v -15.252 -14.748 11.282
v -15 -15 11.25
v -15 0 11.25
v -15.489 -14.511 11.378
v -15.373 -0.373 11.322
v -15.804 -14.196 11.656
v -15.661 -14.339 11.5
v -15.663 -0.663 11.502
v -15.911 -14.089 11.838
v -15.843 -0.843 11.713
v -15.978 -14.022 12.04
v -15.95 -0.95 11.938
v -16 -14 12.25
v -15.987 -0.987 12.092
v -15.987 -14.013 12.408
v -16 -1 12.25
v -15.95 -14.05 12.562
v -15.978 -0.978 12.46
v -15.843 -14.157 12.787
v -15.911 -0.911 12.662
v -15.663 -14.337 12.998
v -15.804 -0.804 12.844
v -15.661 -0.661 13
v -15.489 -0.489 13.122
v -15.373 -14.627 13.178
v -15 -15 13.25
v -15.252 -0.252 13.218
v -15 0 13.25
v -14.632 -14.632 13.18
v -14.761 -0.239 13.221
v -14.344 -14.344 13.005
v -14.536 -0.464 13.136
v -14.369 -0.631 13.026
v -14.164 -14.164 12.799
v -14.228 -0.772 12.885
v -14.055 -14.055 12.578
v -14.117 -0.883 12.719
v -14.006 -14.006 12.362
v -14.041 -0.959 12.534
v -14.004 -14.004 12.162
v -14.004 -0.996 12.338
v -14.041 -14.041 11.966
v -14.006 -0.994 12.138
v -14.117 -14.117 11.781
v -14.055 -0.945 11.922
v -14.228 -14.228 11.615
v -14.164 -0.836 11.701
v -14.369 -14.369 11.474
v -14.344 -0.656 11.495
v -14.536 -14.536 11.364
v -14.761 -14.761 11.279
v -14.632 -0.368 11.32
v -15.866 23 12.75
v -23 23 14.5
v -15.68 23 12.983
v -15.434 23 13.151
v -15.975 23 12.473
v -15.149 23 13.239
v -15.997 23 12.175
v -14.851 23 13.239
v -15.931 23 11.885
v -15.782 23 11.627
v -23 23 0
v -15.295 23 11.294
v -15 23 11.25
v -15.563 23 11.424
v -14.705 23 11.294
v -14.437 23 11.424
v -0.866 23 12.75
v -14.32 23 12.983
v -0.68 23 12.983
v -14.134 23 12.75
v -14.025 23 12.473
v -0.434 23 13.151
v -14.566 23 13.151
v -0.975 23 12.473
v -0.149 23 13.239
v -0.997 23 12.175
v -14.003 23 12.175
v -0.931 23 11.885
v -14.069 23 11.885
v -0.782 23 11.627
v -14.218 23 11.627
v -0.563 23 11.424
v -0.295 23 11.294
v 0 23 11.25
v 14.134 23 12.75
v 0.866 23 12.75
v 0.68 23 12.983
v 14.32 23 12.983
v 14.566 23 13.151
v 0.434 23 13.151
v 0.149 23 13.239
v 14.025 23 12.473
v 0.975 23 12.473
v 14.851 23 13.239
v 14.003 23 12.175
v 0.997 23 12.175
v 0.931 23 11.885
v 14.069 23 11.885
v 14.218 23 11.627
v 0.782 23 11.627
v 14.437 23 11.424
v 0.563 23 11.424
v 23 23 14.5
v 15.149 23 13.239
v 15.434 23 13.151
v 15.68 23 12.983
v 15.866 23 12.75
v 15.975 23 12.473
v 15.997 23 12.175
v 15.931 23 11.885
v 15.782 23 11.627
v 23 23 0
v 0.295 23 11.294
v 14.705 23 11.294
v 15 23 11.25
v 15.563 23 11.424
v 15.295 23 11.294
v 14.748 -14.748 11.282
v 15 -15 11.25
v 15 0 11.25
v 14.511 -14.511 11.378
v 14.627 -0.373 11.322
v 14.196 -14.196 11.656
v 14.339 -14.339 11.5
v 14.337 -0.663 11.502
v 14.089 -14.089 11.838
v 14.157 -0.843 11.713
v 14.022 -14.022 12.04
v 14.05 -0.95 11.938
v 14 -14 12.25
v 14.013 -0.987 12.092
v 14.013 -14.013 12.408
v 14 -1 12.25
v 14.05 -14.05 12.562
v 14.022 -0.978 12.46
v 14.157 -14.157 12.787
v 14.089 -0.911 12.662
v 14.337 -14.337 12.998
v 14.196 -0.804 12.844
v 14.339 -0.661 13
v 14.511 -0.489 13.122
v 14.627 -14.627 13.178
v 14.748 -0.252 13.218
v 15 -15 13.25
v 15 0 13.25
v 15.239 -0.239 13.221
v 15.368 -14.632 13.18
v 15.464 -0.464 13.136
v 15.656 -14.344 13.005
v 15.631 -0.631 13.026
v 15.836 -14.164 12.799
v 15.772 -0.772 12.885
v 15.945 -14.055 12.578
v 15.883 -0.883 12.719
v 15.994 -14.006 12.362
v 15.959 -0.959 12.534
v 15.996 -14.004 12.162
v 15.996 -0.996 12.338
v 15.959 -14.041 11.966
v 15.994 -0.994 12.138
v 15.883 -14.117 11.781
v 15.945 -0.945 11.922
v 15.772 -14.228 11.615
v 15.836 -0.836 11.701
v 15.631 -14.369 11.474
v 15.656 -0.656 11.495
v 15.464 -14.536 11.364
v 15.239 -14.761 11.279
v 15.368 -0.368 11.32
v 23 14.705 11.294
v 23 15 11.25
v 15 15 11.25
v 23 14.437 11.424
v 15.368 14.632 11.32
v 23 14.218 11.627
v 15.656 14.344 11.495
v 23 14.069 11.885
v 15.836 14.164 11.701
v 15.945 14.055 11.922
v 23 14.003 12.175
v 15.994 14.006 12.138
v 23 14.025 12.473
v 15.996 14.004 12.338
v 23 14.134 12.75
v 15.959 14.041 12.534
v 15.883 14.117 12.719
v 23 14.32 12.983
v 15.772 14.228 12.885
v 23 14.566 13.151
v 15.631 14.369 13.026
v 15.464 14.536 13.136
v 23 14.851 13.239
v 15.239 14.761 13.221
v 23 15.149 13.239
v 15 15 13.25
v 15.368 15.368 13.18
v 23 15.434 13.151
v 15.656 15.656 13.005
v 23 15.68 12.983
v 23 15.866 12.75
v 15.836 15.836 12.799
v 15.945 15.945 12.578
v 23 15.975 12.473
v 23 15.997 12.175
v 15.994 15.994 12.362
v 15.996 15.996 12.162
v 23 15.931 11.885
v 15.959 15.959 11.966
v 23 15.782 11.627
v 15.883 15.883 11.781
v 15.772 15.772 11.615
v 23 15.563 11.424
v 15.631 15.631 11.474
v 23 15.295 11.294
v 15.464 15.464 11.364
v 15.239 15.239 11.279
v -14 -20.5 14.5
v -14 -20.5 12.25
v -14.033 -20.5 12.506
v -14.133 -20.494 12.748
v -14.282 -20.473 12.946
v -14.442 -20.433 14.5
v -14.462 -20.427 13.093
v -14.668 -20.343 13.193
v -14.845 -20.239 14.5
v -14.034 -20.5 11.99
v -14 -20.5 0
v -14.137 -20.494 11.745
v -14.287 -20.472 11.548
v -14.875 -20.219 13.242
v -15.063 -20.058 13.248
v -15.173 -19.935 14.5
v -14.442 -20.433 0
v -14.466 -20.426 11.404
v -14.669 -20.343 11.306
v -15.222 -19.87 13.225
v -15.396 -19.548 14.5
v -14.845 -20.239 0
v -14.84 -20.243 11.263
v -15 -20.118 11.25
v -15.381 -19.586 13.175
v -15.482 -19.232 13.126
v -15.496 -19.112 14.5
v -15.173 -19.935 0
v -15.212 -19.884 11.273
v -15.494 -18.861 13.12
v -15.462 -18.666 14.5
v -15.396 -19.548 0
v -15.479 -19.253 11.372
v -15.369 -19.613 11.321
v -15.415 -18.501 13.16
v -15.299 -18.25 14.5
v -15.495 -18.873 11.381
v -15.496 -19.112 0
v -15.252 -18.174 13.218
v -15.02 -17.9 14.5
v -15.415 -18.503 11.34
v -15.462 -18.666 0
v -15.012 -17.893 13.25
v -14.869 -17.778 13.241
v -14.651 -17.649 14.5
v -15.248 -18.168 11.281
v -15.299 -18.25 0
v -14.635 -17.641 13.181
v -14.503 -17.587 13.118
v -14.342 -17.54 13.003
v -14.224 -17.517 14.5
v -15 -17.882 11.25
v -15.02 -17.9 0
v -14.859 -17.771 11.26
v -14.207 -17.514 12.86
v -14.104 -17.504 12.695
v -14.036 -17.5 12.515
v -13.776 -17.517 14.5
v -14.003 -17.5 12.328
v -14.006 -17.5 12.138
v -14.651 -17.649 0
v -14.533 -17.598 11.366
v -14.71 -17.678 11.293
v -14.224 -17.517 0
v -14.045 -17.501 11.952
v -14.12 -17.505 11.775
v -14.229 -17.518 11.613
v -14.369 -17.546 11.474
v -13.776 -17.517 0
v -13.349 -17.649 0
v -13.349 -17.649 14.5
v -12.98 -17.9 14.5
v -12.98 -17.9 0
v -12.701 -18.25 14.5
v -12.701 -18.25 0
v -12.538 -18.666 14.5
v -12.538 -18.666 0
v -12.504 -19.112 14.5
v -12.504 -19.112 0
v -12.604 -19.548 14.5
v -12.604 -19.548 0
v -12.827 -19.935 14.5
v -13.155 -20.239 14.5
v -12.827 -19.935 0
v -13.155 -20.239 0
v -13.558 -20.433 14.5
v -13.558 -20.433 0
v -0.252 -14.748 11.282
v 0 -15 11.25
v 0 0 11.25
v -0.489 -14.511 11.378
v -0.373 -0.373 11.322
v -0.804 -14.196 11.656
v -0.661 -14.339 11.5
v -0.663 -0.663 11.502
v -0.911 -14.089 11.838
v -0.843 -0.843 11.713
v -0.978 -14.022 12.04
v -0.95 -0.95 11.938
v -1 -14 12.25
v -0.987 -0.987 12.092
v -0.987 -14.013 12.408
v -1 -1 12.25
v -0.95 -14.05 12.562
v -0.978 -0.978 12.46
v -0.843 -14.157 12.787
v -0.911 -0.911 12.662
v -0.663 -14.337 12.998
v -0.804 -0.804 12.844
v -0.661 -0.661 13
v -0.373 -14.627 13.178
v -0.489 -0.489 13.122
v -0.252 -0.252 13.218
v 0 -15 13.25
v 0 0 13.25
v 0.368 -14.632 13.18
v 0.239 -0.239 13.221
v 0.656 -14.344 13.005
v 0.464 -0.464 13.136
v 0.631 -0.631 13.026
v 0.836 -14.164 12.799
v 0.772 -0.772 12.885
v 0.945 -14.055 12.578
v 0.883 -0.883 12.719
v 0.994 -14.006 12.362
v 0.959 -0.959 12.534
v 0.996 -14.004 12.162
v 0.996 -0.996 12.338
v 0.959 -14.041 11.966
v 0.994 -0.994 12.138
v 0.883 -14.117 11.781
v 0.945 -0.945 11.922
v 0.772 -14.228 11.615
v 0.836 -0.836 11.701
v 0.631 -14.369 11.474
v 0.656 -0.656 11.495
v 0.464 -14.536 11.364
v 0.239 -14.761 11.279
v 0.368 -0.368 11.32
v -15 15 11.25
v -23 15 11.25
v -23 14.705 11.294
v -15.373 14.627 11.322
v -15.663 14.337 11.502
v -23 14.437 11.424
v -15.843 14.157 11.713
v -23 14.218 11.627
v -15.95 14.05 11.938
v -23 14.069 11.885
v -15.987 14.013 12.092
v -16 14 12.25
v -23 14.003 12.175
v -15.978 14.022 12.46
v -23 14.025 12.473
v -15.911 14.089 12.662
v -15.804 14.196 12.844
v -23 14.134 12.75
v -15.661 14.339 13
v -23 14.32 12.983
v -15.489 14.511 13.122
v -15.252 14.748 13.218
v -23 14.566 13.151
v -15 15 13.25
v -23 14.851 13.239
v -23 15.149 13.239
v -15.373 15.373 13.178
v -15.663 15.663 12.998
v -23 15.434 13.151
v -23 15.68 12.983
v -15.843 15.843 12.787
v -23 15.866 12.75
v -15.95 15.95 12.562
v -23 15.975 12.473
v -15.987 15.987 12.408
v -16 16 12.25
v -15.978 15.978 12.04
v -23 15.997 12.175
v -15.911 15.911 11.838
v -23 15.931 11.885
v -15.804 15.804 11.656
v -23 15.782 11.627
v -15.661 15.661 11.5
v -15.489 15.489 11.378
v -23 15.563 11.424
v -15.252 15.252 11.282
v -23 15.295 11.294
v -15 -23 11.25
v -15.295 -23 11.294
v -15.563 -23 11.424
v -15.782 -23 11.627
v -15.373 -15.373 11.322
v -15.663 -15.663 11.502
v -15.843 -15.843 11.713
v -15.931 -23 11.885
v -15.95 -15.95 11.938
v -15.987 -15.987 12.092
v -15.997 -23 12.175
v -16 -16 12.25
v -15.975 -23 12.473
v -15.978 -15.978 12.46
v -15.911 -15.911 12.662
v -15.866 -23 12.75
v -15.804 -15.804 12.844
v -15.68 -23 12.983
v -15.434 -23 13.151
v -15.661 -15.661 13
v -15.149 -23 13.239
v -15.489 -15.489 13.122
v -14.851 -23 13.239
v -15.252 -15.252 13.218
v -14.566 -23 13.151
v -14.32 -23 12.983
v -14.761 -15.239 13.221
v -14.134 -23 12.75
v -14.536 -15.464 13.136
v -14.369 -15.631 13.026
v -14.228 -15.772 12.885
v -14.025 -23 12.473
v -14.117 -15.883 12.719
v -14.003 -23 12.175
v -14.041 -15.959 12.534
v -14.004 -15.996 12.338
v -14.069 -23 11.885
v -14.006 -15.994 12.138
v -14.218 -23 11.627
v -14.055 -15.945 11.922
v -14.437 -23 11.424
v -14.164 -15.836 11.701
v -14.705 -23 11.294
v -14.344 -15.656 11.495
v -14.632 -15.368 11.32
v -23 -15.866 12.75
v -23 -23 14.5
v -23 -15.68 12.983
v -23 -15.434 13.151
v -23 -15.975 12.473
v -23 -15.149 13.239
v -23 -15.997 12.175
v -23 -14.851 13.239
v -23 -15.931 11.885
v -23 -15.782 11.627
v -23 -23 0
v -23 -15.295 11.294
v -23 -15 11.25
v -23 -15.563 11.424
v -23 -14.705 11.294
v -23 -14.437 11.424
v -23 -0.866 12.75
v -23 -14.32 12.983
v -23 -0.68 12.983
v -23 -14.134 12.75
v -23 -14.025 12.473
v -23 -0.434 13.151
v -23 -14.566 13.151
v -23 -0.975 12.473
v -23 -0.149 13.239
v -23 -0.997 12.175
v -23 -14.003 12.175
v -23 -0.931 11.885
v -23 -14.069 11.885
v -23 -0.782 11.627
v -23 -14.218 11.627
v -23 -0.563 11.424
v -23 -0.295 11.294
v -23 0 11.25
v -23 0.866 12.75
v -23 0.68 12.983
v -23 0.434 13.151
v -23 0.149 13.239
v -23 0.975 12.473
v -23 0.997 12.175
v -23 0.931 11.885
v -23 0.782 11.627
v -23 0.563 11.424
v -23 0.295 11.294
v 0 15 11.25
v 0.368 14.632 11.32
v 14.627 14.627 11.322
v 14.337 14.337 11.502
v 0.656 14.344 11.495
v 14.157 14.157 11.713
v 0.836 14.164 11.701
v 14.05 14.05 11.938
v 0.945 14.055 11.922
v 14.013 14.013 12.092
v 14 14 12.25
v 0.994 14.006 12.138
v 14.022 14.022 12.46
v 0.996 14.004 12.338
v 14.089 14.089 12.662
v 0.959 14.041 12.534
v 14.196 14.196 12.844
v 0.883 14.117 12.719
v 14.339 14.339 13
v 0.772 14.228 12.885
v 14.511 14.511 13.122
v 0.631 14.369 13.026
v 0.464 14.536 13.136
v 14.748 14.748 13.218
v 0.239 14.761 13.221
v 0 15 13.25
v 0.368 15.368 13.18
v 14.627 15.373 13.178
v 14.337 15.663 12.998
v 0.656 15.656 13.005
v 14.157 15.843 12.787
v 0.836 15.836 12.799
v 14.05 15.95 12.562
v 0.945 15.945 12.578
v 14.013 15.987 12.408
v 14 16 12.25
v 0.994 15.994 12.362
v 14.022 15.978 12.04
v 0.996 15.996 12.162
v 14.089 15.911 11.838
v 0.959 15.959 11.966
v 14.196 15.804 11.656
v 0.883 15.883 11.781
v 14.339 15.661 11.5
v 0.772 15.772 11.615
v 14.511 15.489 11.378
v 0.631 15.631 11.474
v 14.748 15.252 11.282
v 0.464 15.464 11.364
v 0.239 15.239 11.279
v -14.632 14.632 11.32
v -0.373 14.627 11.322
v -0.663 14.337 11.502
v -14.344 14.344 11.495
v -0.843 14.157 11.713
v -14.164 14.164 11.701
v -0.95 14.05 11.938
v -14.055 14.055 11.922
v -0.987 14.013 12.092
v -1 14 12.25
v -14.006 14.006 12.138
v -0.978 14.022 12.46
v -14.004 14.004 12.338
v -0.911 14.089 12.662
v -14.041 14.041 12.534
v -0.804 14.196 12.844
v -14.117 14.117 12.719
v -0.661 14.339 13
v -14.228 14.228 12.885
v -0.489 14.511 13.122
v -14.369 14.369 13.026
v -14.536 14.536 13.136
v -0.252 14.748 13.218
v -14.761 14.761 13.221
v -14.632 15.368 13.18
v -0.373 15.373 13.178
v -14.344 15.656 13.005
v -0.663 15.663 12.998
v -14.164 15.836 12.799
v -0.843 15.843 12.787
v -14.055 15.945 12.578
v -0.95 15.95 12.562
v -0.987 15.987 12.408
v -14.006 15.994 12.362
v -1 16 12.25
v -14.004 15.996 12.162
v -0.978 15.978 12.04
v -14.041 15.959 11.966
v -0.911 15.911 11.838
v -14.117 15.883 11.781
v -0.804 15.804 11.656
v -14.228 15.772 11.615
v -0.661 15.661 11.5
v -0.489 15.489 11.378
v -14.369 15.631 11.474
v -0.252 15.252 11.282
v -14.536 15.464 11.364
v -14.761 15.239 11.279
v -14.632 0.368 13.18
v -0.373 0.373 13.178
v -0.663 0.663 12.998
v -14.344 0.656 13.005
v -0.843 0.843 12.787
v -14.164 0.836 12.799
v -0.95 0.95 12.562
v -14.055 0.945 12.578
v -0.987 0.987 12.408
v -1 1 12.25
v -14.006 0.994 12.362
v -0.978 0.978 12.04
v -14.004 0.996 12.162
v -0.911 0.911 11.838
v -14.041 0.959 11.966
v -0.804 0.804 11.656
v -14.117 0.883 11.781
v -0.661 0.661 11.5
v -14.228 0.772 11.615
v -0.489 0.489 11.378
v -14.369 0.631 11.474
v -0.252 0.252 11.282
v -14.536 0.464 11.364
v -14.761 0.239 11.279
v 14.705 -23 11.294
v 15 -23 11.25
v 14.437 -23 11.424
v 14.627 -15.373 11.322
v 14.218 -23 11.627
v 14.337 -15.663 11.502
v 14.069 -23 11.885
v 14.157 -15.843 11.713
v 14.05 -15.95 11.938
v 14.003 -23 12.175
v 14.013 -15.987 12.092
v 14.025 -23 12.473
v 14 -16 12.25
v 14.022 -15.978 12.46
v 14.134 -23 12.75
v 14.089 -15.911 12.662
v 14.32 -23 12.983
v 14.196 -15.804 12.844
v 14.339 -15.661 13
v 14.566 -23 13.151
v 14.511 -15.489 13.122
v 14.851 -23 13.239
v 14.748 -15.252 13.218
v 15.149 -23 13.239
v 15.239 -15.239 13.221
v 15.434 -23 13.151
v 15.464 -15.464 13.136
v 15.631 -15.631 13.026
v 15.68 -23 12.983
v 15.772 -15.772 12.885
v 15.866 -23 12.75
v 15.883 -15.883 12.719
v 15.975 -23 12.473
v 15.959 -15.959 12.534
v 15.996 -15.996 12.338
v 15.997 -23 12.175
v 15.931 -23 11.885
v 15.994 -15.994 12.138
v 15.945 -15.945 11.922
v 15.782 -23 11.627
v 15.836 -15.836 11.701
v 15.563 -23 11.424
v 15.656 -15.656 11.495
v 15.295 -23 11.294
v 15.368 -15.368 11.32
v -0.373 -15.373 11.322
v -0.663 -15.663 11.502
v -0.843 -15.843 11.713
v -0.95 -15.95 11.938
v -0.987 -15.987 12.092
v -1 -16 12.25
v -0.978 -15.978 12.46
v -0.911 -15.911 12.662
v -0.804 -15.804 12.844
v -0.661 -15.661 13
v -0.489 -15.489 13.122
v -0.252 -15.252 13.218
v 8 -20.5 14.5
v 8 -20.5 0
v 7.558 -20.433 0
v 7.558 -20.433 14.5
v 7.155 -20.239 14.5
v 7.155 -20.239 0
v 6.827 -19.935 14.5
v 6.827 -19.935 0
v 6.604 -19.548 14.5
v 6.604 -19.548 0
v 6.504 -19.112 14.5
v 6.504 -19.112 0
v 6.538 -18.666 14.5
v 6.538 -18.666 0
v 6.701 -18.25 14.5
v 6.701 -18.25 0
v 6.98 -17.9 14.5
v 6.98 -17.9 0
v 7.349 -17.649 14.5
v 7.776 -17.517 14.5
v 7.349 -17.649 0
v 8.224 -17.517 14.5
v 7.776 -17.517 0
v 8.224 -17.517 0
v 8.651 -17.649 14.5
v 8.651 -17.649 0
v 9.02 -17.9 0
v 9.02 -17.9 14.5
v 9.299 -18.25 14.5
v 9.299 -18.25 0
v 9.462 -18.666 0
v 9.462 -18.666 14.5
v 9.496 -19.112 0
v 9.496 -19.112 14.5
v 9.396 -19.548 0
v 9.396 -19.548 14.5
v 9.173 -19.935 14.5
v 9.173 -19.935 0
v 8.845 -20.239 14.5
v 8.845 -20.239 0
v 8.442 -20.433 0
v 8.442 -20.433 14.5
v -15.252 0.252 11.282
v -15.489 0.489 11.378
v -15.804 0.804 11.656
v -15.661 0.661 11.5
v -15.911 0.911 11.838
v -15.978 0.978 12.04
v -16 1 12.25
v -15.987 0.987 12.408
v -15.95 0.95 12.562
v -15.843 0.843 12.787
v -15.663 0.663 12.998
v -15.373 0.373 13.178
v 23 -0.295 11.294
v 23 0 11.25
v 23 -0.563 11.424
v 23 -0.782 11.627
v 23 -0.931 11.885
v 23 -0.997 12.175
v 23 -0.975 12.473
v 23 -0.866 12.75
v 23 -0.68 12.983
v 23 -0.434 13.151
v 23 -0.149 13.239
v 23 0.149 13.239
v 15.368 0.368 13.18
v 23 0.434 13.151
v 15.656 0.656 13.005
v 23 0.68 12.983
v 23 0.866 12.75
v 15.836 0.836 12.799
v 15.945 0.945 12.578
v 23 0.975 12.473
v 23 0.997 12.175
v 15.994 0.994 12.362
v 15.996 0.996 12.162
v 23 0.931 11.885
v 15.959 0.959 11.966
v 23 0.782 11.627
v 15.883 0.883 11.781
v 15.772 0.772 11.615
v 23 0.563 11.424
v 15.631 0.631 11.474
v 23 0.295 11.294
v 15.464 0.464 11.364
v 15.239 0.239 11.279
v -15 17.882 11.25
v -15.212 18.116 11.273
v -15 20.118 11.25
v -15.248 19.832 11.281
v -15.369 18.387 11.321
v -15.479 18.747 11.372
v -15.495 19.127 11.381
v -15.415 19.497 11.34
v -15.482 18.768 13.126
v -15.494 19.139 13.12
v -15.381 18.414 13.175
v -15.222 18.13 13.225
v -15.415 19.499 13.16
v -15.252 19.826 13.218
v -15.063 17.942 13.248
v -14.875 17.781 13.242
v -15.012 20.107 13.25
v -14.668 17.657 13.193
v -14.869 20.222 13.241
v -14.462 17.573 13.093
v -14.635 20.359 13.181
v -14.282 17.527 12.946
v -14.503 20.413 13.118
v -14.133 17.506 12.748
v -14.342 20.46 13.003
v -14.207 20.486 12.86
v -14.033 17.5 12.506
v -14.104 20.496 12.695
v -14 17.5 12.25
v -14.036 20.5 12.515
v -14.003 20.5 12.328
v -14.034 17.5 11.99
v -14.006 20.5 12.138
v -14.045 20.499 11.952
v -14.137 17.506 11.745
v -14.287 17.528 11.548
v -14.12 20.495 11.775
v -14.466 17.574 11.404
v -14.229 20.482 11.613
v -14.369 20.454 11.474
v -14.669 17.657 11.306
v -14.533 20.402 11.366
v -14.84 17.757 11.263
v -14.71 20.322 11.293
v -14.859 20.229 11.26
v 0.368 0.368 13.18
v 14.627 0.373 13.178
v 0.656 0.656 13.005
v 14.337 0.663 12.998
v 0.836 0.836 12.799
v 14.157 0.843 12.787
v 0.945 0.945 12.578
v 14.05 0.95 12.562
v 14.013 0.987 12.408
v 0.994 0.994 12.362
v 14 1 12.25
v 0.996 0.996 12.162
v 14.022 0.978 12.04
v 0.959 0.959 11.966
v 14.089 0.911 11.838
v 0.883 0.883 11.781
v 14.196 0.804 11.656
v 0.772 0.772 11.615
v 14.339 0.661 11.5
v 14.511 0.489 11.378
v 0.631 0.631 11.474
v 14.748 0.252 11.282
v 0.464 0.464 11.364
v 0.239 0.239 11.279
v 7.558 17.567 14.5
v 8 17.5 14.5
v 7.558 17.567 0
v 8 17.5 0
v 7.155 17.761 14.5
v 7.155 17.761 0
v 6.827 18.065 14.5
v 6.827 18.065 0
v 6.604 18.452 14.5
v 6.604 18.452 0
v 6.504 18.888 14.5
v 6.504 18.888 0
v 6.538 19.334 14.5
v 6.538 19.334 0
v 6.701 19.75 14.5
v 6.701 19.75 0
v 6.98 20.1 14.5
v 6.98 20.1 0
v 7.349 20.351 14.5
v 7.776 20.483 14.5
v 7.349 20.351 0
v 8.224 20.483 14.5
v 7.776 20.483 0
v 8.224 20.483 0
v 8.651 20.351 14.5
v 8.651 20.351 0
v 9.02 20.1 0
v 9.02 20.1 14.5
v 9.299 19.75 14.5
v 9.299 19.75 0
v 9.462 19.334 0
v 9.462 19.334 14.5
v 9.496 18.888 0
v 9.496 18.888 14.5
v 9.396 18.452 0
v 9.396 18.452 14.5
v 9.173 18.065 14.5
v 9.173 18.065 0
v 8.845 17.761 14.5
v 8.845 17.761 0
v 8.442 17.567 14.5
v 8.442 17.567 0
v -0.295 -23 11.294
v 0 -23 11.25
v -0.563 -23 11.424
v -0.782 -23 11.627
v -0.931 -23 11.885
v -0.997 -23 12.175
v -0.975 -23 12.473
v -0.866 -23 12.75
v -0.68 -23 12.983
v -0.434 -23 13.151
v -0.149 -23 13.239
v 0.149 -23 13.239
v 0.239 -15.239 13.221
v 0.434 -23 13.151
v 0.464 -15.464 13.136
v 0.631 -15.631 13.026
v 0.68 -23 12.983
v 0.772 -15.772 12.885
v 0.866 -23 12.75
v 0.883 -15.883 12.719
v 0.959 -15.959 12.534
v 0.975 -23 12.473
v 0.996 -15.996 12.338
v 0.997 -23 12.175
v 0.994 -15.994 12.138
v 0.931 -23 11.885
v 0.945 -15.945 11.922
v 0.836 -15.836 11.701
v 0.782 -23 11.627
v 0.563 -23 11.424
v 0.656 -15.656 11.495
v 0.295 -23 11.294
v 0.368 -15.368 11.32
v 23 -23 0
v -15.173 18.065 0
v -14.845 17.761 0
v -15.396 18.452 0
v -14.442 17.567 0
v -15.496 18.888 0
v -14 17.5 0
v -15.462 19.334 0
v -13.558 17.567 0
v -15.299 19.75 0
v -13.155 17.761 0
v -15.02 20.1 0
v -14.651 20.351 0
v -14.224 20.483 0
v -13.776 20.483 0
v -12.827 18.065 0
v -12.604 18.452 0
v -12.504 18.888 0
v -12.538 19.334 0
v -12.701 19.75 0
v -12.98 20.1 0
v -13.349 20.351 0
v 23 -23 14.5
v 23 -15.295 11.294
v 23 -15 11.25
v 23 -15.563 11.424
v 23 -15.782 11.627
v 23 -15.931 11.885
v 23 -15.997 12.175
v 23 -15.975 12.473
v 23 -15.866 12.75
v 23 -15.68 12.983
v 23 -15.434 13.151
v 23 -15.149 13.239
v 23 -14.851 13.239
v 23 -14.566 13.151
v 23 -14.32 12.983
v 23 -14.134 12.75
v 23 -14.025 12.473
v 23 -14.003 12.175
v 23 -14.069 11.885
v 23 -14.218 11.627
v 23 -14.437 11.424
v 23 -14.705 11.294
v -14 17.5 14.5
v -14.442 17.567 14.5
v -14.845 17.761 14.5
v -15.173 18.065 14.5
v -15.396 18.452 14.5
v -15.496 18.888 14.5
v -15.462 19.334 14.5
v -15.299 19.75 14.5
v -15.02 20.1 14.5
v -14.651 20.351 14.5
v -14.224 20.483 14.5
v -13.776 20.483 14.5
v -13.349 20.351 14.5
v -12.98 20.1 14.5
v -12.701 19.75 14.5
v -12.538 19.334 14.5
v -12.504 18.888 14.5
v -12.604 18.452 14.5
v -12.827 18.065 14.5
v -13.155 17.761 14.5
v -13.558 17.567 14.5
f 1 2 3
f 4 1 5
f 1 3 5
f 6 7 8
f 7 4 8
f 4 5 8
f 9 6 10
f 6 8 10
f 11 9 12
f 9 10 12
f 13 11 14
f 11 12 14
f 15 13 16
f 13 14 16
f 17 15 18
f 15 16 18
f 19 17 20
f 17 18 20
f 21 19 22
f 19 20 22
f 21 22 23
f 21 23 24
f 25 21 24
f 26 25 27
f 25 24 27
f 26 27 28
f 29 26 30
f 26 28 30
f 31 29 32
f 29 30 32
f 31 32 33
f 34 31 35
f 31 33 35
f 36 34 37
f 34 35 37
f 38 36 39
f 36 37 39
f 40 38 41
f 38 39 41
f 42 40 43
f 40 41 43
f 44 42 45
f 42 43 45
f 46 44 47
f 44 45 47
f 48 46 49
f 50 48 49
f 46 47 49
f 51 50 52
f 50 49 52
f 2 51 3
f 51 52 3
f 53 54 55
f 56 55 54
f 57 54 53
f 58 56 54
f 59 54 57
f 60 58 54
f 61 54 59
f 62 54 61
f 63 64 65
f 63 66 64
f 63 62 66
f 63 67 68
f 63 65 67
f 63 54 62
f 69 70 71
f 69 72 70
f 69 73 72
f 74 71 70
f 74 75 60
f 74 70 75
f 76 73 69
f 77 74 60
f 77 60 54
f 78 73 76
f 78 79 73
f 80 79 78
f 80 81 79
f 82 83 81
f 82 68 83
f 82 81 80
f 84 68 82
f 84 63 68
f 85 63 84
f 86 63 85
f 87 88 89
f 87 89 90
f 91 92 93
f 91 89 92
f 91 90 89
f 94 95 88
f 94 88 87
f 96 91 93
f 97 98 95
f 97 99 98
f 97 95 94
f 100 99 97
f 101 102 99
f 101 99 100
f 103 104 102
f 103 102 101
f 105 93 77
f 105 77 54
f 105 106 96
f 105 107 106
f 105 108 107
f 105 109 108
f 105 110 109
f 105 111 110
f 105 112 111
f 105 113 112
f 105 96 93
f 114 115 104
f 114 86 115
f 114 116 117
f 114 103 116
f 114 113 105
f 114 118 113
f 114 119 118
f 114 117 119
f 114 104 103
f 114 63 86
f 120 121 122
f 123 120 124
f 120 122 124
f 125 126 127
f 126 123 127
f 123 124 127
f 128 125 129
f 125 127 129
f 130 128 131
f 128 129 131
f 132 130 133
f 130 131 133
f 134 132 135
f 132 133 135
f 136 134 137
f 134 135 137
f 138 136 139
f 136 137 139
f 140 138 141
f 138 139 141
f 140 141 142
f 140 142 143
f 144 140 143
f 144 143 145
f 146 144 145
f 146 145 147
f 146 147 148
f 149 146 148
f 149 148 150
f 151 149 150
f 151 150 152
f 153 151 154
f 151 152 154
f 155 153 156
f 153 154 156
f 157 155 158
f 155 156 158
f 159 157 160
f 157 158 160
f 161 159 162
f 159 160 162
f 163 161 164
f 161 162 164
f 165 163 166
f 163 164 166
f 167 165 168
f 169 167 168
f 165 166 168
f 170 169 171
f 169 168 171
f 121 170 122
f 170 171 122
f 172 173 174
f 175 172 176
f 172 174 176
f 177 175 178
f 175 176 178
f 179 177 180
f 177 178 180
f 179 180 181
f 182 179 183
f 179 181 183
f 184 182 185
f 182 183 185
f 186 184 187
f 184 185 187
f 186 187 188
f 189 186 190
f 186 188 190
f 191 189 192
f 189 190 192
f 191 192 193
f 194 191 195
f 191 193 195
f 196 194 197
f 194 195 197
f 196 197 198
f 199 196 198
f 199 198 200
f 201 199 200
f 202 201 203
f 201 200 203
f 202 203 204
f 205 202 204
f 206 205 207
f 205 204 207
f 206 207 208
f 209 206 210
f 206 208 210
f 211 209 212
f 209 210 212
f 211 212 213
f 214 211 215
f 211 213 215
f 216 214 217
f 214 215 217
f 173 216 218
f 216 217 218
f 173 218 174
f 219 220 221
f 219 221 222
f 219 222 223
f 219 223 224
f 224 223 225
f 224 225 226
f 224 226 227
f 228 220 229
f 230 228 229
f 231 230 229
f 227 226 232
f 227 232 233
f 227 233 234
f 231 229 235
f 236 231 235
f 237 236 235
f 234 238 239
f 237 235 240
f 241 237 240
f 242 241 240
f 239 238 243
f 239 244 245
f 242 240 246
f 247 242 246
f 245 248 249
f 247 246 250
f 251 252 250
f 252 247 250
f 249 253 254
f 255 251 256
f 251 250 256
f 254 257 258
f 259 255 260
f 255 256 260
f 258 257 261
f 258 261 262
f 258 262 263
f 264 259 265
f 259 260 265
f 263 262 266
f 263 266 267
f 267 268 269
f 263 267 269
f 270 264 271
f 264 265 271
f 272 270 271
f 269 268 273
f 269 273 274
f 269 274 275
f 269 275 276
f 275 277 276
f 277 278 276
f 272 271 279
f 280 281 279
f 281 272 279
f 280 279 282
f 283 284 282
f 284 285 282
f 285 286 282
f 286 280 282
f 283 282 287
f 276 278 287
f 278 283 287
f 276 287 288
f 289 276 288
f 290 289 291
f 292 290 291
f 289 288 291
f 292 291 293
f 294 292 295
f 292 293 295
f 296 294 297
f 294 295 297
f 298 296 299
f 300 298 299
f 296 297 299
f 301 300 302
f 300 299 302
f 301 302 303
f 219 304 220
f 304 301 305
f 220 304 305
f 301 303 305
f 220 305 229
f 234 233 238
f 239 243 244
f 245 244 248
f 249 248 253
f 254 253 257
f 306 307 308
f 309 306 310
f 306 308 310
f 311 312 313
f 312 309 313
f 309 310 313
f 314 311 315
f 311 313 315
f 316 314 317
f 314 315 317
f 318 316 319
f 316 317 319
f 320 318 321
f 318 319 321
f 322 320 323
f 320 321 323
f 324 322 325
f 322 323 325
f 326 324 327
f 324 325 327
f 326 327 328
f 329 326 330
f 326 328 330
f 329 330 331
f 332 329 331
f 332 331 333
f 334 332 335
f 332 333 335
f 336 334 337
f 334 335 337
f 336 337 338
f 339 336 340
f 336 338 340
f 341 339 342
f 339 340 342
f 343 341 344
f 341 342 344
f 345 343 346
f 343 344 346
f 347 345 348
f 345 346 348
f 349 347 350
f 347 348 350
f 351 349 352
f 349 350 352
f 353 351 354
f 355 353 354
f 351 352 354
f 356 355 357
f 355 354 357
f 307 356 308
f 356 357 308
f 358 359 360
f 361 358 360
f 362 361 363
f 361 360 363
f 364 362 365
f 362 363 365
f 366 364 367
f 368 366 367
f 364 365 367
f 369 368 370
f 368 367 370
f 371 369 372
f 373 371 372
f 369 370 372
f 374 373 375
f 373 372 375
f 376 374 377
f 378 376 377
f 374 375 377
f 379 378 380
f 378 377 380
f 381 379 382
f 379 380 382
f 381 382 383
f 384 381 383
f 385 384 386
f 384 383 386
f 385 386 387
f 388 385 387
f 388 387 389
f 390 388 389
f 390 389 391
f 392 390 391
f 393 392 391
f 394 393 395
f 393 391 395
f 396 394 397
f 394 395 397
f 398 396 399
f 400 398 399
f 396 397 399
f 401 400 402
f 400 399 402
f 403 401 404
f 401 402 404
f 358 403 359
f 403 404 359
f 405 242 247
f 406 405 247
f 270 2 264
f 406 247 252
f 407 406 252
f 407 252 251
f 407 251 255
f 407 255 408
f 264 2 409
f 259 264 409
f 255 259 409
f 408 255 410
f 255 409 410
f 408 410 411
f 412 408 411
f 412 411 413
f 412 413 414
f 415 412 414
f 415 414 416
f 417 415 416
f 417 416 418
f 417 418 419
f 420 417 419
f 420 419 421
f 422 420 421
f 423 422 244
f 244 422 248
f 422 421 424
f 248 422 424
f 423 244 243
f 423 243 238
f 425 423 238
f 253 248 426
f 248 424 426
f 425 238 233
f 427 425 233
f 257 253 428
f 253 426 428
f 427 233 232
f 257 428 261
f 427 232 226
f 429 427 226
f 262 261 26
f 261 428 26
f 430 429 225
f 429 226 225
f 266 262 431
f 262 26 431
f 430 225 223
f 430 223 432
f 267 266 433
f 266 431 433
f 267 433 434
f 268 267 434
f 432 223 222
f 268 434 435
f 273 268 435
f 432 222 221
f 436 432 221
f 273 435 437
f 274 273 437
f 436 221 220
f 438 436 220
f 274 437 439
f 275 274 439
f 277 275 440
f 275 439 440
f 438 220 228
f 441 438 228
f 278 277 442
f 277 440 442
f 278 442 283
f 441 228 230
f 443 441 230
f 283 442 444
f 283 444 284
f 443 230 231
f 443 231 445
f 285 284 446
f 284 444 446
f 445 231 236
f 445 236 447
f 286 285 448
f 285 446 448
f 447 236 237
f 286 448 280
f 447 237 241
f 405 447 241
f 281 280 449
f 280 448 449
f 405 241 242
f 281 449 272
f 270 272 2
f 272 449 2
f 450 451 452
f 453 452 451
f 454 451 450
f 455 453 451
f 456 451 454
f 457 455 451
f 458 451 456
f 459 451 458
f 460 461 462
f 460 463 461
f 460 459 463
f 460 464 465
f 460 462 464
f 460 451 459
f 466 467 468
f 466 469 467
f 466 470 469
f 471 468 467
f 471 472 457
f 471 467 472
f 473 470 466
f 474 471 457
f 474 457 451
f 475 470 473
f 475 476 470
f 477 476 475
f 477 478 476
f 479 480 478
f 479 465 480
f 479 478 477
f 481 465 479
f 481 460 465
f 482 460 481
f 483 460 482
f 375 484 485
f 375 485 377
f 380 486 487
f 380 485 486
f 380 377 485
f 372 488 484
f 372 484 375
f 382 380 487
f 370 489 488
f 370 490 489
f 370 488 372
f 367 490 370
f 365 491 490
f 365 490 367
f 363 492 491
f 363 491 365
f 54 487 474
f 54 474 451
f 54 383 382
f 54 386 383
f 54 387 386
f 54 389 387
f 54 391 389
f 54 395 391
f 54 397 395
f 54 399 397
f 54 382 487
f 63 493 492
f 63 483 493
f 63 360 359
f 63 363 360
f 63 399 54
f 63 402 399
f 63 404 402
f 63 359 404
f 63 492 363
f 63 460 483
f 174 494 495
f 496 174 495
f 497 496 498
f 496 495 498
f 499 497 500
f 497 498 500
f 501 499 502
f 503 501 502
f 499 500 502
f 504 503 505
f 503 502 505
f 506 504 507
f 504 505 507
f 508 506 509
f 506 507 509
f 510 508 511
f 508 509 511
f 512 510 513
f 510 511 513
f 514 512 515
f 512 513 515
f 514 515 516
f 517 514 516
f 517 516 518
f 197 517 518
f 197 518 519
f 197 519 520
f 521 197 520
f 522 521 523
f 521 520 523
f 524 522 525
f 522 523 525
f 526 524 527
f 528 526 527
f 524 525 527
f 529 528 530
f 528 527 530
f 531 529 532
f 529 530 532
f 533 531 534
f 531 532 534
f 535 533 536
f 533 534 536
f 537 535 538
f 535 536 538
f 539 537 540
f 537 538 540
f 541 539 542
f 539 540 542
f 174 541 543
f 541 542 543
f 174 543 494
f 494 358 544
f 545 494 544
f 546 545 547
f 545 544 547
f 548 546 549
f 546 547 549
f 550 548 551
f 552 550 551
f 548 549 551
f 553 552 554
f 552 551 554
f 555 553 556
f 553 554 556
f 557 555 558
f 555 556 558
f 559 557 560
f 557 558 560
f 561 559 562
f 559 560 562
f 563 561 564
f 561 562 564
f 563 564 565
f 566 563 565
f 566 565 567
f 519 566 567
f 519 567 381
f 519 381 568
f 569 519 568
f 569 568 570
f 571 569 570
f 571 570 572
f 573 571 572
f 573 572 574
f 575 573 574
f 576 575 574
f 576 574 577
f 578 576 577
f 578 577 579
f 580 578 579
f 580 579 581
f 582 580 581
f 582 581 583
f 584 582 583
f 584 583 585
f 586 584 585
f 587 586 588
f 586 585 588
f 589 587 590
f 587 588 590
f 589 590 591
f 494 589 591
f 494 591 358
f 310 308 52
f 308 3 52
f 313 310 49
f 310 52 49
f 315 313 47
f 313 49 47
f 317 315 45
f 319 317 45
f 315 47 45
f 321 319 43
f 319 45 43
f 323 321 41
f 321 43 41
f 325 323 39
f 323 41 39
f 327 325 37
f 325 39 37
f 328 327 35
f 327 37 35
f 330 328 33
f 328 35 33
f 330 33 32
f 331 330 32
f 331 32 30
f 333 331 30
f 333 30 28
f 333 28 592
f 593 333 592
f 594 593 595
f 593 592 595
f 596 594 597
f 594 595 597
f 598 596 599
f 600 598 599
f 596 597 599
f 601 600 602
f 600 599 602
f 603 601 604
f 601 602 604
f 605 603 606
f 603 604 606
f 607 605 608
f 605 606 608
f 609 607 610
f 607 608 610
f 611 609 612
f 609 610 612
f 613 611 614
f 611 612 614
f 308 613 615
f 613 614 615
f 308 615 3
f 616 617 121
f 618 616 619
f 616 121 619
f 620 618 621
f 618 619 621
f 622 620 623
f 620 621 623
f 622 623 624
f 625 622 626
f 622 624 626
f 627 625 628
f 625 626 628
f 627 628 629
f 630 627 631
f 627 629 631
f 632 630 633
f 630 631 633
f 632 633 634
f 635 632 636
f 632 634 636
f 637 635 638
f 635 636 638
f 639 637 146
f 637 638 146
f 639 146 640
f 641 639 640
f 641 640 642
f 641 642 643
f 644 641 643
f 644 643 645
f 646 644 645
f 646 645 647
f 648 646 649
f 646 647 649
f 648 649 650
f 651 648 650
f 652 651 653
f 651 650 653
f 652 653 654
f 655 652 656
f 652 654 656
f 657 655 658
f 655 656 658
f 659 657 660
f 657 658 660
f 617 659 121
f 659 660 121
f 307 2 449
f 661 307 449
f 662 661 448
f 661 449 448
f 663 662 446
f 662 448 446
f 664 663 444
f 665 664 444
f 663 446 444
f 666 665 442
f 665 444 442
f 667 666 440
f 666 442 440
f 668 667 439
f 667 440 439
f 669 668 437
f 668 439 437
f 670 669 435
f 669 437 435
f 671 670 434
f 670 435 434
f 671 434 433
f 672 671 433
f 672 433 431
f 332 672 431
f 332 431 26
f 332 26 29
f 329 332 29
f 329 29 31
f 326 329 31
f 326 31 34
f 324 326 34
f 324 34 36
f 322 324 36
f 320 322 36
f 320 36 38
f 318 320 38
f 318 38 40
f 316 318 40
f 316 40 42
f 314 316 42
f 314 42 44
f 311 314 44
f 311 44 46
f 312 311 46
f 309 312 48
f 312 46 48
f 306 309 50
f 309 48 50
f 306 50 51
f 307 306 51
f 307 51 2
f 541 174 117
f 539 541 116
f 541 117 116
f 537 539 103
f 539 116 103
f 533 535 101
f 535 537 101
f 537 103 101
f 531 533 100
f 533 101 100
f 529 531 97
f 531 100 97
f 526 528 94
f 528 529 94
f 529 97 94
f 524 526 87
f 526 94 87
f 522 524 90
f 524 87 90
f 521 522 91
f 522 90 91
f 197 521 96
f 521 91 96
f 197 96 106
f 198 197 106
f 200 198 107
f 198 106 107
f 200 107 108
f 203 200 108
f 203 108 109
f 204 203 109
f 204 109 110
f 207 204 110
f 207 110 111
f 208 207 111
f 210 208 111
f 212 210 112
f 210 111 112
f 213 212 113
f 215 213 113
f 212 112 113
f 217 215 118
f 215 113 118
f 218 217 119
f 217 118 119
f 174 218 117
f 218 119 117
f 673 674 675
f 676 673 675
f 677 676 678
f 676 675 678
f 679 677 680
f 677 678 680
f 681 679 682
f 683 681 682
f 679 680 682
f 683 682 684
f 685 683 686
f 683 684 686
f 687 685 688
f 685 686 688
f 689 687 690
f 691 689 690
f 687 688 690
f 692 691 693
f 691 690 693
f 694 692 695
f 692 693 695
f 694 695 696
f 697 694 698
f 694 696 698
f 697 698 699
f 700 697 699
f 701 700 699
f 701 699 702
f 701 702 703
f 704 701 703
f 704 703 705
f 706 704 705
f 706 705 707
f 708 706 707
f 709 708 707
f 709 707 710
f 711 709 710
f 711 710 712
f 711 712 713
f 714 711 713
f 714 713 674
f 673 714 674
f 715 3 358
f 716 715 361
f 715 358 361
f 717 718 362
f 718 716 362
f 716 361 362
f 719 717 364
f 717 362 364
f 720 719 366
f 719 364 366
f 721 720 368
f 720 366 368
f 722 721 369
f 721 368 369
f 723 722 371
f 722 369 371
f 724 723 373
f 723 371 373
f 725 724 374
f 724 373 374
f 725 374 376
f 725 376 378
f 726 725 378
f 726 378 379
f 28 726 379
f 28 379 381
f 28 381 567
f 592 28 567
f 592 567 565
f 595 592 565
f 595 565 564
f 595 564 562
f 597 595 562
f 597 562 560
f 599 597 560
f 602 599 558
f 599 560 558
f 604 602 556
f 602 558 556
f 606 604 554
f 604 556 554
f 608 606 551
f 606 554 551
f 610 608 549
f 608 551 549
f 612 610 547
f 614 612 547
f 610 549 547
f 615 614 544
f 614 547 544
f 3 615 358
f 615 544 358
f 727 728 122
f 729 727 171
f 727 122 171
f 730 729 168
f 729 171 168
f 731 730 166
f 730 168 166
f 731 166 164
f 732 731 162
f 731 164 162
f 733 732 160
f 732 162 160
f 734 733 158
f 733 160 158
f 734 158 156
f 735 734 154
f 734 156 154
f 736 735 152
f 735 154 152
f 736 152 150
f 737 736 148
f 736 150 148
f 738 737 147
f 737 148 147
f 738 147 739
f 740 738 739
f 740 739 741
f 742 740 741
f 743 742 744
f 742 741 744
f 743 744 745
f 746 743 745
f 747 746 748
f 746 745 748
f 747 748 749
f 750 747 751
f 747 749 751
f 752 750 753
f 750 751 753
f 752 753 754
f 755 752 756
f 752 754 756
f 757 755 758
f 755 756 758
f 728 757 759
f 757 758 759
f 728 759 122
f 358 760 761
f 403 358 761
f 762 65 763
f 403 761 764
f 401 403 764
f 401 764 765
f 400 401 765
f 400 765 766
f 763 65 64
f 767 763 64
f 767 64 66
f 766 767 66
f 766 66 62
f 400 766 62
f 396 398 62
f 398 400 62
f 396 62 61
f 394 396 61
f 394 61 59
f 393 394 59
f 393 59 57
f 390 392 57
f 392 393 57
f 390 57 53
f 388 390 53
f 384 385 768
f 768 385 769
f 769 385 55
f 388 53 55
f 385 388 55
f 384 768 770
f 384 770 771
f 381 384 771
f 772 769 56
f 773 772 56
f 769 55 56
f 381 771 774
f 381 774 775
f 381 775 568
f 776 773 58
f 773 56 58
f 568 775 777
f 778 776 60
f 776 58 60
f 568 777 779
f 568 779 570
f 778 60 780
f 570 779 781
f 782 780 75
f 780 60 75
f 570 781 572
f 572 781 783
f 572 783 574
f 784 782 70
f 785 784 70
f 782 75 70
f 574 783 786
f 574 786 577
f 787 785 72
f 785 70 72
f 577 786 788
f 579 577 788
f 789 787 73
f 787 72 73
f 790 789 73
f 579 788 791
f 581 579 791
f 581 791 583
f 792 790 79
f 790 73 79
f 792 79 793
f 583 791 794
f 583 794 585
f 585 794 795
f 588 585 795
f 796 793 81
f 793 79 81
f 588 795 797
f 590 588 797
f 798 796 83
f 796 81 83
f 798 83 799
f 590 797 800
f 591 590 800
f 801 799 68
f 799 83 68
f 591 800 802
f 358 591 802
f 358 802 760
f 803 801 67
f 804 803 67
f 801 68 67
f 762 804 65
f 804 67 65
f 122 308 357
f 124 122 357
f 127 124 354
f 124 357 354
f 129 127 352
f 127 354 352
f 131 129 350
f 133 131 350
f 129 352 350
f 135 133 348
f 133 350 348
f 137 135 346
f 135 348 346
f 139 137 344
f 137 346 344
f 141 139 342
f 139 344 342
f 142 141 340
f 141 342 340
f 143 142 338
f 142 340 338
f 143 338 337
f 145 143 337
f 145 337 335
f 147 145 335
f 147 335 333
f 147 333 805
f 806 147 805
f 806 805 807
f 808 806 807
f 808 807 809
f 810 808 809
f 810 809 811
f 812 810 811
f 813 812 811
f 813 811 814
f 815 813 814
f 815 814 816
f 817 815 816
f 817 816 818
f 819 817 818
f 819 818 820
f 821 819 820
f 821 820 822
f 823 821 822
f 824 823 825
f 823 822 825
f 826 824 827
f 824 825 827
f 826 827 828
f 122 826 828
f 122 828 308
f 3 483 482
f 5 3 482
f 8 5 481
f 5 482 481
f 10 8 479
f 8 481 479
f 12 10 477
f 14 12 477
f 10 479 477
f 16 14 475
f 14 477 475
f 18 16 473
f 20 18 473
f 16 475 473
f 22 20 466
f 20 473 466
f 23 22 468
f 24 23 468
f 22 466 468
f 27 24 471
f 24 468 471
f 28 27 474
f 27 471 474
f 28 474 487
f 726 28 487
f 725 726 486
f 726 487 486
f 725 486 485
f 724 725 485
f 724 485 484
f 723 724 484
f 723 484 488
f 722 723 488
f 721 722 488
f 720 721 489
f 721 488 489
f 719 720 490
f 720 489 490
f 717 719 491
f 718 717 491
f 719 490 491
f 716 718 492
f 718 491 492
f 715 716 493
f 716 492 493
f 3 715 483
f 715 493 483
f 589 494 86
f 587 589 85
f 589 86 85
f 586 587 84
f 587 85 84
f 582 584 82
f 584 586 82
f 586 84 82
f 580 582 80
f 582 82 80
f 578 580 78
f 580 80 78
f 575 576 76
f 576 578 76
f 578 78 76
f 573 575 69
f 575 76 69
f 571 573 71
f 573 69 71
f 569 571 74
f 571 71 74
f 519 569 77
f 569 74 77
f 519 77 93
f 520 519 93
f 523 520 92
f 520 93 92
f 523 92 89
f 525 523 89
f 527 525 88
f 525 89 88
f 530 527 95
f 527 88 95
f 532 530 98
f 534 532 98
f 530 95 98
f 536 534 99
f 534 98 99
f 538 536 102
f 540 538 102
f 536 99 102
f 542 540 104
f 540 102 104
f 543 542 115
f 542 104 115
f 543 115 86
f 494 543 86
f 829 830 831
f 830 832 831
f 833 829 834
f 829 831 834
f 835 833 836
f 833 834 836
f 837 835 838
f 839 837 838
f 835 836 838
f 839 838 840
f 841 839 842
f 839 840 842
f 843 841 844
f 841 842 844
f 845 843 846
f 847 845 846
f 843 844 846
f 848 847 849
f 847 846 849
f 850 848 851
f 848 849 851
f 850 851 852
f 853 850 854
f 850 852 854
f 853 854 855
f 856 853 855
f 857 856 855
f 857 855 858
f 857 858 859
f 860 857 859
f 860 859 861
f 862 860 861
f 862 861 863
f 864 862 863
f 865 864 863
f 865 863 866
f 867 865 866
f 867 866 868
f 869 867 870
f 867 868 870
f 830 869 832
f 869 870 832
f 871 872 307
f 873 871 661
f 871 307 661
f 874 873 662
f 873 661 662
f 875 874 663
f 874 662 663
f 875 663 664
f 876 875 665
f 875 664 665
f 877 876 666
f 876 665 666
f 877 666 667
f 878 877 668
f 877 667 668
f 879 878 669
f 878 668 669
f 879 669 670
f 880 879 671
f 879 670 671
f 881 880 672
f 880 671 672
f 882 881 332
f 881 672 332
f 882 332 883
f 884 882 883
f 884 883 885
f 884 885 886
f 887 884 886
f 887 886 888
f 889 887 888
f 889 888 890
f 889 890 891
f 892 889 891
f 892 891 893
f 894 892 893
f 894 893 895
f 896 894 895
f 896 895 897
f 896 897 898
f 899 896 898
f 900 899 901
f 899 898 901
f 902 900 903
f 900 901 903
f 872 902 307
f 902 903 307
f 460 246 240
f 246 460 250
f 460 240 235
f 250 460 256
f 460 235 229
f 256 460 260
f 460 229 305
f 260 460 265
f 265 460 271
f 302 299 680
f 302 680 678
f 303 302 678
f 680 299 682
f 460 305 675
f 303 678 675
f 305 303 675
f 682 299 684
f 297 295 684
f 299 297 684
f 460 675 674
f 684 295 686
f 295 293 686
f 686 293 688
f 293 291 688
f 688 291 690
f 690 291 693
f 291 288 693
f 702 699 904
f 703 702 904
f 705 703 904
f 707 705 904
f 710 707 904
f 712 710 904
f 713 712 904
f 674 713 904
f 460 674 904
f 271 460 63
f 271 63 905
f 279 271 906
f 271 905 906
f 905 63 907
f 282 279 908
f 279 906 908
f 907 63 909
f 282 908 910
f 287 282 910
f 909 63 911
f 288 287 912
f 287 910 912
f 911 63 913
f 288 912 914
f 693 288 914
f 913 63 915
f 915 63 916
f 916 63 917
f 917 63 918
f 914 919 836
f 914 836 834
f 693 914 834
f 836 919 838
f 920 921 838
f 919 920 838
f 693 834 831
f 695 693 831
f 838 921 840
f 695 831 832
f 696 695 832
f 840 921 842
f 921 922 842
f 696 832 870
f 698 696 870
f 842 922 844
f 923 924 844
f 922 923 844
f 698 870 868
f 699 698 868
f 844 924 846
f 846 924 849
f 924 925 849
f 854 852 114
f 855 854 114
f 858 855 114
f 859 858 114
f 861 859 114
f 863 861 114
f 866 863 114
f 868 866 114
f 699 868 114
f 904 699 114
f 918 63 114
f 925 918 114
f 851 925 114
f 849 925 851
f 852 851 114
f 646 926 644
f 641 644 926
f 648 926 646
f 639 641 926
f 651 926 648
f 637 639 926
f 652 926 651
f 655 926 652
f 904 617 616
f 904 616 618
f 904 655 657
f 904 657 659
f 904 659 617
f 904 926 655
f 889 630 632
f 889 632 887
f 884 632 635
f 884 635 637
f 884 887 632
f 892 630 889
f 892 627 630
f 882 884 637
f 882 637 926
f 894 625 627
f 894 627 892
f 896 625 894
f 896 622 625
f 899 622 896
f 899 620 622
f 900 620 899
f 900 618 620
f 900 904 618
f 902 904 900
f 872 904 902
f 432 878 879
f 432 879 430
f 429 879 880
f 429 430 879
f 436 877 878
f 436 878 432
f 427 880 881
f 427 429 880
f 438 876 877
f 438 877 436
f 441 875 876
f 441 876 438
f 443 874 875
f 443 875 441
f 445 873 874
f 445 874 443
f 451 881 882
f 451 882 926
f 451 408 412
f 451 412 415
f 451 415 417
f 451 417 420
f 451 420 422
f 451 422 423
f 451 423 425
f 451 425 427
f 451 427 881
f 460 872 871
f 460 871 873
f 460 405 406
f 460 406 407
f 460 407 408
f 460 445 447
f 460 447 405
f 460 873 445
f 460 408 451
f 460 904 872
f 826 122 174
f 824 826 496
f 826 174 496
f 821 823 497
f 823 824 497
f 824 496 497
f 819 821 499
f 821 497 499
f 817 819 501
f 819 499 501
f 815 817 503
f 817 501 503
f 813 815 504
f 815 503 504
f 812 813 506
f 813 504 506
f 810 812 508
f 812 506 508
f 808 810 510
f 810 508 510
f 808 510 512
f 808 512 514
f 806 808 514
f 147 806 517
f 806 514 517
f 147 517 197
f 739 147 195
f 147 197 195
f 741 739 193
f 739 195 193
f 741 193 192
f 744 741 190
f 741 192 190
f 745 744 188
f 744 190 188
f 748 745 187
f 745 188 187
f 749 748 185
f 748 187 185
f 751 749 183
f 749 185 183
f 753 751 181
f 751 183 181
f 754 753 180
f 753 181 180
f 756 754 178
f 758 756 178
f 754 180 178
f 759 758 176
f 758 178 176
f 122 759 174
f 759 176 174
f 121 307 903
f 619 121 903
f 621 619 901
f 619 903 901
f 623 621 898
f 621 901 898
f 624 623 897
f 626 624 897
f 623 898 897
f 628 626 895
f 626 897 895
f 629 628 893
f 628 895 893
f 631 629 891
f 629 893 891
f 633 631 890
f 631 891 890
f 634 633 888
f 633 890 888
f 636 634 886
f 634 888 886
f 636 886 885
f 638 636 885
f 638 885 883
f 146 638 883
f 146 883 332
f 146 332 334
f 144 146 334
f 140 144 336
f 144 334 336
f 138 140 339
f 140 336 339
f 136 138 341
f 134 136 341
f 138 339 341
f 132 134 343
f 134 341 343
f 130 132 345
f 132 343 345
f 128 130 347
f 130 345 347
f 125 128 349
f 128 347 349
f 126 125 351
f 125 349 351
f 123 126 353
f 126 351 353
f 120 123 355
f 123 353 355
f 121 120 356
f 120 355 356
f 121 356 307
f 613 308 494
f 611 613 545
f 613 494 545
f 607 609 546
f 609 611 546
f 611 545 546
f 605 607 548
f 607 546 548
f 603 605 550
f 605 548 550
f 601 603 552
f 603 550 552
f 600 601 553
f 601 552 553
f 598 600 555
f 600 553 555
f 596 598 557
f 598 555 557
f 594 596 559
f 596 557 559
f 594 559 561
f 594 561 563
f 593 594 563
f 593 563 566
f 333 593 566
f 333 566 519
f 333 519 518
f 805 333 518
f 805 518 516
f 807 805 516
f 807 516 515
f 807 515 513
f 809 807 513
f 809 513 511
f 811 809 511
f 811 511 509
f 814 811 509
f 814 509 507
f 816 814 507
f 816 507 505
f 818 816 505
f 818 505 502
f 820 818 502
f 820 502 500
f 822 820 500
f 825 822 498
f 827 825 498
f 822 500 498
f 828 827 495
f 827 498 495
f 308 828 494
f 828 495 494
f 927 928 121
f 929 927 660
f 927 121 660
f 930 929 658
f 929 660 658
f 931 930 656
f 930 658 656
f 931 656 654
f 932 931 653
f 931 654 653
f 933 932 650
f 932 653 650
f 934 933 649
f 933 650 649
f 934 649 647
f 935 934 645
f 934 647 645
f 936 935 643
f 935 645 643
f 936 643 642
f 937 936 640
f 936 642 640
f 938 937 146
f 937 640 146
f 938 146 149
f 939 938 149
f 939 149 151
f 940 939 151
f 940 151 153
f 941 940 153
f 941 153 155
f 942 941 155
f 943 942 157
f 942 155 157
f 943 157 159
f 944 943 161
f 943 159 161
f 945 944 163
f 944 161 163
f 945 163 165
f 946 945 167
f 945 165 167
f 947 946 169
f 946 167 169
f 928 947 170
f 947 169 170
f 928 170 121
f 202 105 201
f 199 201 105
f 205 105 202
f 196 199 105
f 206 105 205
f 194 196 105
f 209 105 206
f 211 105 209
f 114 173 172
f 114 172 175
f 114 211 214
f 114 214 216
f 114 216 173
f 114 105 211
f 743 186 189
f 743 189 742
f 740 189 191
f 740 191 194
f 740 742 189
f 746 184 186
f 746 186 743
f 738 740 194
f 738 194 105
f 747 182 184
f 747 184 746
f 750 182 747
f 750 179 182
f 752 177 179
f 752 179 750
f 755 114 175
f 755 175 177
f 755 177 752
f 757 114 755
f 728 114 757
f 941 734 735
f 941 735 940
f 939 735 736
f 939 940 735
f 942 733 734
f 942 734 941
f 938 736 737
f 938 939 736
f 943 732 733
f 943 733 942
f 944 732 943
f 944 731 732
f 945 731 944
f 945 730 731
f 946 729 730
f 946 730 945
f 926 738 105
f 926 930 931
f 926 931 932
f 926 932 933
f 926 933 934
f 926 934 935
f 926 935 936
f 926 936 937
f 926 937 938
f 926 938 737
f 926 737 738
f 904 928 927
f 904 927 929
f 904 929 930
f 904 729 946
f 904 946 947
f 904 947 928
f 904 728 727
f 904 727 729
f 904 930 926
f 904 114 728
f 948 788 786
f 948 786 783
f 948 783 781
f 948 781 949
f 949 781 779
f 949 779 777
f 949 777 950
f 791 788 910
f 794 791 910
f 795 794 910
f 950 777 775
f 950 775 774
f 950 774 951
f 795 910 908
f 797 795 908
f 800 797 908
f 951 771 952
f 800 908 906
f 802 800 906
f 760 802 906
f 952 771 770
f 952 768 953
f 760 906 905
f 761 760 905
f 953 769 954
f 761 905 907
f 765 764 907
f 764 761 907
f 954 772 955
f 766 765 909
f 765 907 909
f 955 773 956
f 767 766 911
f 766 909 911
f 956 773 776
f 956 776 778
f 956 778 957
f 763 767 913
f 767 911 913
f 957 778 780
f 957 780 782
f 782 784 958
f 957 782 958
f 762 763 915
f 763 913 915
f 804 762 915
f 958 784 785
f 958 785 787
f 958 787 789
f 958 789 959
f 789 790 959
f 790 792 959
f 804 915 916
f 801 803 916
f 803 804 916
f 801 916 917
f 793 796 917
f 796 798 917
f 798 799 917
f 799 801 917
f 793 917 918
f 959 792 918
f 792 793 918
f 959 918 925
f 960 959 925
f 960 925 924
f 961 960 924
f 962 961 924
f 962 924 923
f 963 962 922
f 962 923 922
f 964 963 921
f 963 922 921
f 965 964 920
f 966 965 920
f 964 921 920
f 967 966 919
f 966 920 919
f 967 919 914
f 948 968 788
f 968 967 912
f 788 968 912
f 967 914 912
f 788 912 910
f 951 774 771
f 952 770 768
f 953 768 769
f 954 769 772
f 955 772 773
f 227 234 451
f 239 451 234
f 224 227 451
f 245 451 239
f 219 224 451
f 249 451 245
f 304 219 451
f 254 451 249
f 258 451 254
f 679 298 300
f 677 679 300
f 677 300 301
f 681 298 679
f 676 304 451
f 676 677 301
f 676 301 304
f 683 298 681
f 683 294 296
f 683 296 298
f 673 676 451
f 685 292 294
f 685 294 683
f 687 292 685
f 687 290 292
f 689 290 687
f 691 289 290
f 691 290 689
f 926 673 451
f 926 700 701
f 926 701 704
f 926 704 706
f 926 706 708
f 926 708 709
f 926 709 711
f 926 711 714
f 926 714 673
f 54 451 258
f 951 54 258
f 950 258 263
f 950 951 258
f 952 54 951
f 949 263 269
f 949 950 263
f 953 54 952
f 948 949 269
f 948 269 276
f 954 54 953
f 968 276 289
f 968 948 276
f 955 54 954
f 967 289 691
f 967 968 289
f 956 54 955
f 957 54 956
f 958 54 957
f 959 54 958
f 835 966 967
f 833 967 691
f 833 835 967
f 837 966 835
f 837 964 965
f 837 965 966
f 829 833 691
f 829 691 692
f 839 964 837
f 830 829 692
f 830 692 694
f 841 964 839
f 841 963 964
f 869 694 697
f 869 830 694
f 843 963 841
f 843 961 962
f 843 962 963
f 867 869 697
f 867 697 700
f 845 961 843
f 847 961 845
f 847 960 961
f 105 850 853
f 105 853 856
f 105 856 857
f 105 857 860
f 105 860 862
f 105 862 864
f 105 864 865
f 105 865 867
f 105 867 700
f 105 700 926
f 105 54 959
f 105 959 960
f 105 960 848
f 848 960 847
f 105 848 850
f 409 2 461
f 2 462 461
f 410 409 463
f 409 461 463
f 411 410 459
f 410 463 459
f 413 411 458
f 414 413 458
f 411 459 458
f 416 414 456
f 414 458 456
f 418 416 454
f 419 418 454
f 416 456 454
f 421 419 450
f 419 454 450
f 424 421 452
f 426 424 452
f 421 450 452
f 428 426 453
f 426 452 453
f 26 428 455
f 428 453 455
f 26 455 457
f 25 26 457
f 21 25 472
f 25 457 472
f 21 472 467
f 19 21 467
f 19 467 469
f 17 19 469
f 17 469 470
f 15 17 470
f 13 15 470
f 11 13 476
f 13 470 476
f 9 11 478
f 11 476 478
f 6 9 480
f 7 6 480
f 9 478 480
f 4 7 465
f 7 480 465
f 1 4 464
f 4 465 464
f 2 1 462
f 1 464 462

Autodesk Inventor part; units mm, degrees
ref_plane "YZ Plane" through (0, 0, 0) normal (1, 0, 0) x (0, 1, 0)
ref_plane "XZ Plane" through (0, 0, 0) normal (0, 1, 0) x (-1, 0, 0)
ref_plane "XY Plane" through (0, 0, 0) normal (0, 0, 1) x (1, 0, 0)
sketch "スケッチ1" plane through (0, 0, 0) normal (0, 0, 1) x (1, 0, 0)
  line L0 (-23, 23) -> (23, 23)
  line L1 (23, 23) -> (23, -23)
  line L2 (23, -23) -> (-23, -23)
  line L3 (-23, -23) -> (-23, 23)
  point P0 (0, 0)
  dimension "d0" = 46
  dimension "d1" = 46
  dimension "d2" = 23
  dimension "d3" = 23
extrude "押し出し1" add sketch "スケッチ1" along normal blind 14.5
sketch "スケッチ2" plane through (23, -23, 0) normal (1, 0, 0) x (0, 0, -1)
  line L0 (0, 0) -> (-14.5, 0) projected
  line L1 (0, 46) -> (-14.5, 46) projected
  circle A0 centre (-12.25, 38) radius 1
  circle A1 centre (-12.25, 8) radius 1
  circle A2 centre (-12.25, 23) radius 1
  line L2 (-14.5, 46) -> (-14.5, 0) projected
  point P0 (0, 23)
  dimension "d6" = 2
  dimension "d8" = 8
  dimension "d13" = 8
  dimension "d14" = 15
  dimension "d48" = 2.25
  dimension "d49" = 2.25
  dimension "d50" = 2.25
hole "穴1" at (23, -15, 12.25) at (23, 0, 12.25) at (23, 15, 12.25) direction (-1, 0, 0) diameter 2 end through all
sketch "スケッチ3" plane through (-23, -23, 0) normal (0, -1, 0) x (1, 0, 0)
  line L0 (46, 14.5) -> (0, 14.5) projected
  line L1 (0, 0) -> (0, 14.5) projected
  line L2 (46, 0) -> (46, 14.5) projected
  circle A0 centre (8, 12.25) radius 1
  circle A1 centre (23, 12.25) radius 1
  circle A2 centre (38, 12.25) radius 1
  point P0 (23, 0)
  dimension "d22" = 2
  dimension "d23" = 2.25
  dimension "d24" = 2.25
  dimension "d25" = 2.25
  dimension "d26" = 8
  dimension "d27" = 8
  dimension "d28" = 15
hole "穴2" at (-15, -23, 12.25) at (15, -23, 12.25) at (0, -23, 12.25) direction (0, 1, 0) diameter 2 end through all
thread "ねじ1" size "M2x0.4" class "6H" standard "ANSI Metric M Profile" full length
thread "ねじ2" size "M2x0.4" class "6H" standard "ANSI Metric M Profile" full length
thread "ねじ3" size "M2x0.4" class "6H" standard "ANSI Metric M Profile" full length
thread "ねじ4" size "M2x0.4" class "6H" standard "ANSI Metric M Profile" full length
thread "ねじ5" size "M2x0.4" class "6H" standard "ANSI Metric M Profile" full length
thread "ねじ6" size "M2x0.4" class "6H" standard "ANSI Metric M Profile" full length
sketch "スケッチ4" plane through (0, 0, 14.5) normal (0, 0, 1) x (1, 0, 0)
  line L0 (-23, -23) -> (-23, 23) projected
  line L1 (23, -23) -> (-23, -23) projected
  circle A0 centre (-14, 19) radius 1.5
  circle A1 centre (8, 19) radius 1.5
  circle A2 centre (-14, -19) radius 1.5
  circle A3 centre (8, -19) radius 1.5
  dimension "d51" = 3
  dimension "d52" = 22
  dimension "d53" = 22
  dimension "d54" = 38
  dimension "d55" = 38
  dimension "d88" = 9
  dimension "d89" = 9
  dimension "d90" = 4
  dimension "d91" = 4
hole "穴3" at (-14, -19, 14.5) at (-14, 19, 14.5) at (8, -19, 14.5) at (8, 19, 14.5) direction (0, 0, -1) diameter 3 end through all
thread "ねじ7" size "M3x0.5" class "6H" standard "ANSI Metric M Profile" full length
thread "ねじ8" size "M3x0.5" class "6H" standard "ANSI Metric M Profile" full length
thread "ねじ9" size "M3x0.5" class "6H" standard "ANSI Metric M Profile" full length
thread "ねじ10" size "M3x0.5" class "6H" standard "ANSI Metric M Profile" full length
thread "ねじ11" size "M2x0.4" class "6H" standard "ANSI Metric M Profile" full length
thread "ねじ12" size "M2x0.4" class "6H" standard "ANSI Metric M Profile" full length
thread "ねじ13" size "M2x0.4" class "6H" standard "ANSI Metric M Profile" full length
thread "ねじ14" size "M2x0.4" class "6H" standard "ANSI Metric M Profile" full length
thread "ねじ15" size "M2x0.4" class "6H" standard "ANSI Metric M Profile" full length
thread "ねじ16" size "M2x0.4" class "6H" standard "ANSI Metric M Profile" full length
properties material "アセタール樹脂、白"
